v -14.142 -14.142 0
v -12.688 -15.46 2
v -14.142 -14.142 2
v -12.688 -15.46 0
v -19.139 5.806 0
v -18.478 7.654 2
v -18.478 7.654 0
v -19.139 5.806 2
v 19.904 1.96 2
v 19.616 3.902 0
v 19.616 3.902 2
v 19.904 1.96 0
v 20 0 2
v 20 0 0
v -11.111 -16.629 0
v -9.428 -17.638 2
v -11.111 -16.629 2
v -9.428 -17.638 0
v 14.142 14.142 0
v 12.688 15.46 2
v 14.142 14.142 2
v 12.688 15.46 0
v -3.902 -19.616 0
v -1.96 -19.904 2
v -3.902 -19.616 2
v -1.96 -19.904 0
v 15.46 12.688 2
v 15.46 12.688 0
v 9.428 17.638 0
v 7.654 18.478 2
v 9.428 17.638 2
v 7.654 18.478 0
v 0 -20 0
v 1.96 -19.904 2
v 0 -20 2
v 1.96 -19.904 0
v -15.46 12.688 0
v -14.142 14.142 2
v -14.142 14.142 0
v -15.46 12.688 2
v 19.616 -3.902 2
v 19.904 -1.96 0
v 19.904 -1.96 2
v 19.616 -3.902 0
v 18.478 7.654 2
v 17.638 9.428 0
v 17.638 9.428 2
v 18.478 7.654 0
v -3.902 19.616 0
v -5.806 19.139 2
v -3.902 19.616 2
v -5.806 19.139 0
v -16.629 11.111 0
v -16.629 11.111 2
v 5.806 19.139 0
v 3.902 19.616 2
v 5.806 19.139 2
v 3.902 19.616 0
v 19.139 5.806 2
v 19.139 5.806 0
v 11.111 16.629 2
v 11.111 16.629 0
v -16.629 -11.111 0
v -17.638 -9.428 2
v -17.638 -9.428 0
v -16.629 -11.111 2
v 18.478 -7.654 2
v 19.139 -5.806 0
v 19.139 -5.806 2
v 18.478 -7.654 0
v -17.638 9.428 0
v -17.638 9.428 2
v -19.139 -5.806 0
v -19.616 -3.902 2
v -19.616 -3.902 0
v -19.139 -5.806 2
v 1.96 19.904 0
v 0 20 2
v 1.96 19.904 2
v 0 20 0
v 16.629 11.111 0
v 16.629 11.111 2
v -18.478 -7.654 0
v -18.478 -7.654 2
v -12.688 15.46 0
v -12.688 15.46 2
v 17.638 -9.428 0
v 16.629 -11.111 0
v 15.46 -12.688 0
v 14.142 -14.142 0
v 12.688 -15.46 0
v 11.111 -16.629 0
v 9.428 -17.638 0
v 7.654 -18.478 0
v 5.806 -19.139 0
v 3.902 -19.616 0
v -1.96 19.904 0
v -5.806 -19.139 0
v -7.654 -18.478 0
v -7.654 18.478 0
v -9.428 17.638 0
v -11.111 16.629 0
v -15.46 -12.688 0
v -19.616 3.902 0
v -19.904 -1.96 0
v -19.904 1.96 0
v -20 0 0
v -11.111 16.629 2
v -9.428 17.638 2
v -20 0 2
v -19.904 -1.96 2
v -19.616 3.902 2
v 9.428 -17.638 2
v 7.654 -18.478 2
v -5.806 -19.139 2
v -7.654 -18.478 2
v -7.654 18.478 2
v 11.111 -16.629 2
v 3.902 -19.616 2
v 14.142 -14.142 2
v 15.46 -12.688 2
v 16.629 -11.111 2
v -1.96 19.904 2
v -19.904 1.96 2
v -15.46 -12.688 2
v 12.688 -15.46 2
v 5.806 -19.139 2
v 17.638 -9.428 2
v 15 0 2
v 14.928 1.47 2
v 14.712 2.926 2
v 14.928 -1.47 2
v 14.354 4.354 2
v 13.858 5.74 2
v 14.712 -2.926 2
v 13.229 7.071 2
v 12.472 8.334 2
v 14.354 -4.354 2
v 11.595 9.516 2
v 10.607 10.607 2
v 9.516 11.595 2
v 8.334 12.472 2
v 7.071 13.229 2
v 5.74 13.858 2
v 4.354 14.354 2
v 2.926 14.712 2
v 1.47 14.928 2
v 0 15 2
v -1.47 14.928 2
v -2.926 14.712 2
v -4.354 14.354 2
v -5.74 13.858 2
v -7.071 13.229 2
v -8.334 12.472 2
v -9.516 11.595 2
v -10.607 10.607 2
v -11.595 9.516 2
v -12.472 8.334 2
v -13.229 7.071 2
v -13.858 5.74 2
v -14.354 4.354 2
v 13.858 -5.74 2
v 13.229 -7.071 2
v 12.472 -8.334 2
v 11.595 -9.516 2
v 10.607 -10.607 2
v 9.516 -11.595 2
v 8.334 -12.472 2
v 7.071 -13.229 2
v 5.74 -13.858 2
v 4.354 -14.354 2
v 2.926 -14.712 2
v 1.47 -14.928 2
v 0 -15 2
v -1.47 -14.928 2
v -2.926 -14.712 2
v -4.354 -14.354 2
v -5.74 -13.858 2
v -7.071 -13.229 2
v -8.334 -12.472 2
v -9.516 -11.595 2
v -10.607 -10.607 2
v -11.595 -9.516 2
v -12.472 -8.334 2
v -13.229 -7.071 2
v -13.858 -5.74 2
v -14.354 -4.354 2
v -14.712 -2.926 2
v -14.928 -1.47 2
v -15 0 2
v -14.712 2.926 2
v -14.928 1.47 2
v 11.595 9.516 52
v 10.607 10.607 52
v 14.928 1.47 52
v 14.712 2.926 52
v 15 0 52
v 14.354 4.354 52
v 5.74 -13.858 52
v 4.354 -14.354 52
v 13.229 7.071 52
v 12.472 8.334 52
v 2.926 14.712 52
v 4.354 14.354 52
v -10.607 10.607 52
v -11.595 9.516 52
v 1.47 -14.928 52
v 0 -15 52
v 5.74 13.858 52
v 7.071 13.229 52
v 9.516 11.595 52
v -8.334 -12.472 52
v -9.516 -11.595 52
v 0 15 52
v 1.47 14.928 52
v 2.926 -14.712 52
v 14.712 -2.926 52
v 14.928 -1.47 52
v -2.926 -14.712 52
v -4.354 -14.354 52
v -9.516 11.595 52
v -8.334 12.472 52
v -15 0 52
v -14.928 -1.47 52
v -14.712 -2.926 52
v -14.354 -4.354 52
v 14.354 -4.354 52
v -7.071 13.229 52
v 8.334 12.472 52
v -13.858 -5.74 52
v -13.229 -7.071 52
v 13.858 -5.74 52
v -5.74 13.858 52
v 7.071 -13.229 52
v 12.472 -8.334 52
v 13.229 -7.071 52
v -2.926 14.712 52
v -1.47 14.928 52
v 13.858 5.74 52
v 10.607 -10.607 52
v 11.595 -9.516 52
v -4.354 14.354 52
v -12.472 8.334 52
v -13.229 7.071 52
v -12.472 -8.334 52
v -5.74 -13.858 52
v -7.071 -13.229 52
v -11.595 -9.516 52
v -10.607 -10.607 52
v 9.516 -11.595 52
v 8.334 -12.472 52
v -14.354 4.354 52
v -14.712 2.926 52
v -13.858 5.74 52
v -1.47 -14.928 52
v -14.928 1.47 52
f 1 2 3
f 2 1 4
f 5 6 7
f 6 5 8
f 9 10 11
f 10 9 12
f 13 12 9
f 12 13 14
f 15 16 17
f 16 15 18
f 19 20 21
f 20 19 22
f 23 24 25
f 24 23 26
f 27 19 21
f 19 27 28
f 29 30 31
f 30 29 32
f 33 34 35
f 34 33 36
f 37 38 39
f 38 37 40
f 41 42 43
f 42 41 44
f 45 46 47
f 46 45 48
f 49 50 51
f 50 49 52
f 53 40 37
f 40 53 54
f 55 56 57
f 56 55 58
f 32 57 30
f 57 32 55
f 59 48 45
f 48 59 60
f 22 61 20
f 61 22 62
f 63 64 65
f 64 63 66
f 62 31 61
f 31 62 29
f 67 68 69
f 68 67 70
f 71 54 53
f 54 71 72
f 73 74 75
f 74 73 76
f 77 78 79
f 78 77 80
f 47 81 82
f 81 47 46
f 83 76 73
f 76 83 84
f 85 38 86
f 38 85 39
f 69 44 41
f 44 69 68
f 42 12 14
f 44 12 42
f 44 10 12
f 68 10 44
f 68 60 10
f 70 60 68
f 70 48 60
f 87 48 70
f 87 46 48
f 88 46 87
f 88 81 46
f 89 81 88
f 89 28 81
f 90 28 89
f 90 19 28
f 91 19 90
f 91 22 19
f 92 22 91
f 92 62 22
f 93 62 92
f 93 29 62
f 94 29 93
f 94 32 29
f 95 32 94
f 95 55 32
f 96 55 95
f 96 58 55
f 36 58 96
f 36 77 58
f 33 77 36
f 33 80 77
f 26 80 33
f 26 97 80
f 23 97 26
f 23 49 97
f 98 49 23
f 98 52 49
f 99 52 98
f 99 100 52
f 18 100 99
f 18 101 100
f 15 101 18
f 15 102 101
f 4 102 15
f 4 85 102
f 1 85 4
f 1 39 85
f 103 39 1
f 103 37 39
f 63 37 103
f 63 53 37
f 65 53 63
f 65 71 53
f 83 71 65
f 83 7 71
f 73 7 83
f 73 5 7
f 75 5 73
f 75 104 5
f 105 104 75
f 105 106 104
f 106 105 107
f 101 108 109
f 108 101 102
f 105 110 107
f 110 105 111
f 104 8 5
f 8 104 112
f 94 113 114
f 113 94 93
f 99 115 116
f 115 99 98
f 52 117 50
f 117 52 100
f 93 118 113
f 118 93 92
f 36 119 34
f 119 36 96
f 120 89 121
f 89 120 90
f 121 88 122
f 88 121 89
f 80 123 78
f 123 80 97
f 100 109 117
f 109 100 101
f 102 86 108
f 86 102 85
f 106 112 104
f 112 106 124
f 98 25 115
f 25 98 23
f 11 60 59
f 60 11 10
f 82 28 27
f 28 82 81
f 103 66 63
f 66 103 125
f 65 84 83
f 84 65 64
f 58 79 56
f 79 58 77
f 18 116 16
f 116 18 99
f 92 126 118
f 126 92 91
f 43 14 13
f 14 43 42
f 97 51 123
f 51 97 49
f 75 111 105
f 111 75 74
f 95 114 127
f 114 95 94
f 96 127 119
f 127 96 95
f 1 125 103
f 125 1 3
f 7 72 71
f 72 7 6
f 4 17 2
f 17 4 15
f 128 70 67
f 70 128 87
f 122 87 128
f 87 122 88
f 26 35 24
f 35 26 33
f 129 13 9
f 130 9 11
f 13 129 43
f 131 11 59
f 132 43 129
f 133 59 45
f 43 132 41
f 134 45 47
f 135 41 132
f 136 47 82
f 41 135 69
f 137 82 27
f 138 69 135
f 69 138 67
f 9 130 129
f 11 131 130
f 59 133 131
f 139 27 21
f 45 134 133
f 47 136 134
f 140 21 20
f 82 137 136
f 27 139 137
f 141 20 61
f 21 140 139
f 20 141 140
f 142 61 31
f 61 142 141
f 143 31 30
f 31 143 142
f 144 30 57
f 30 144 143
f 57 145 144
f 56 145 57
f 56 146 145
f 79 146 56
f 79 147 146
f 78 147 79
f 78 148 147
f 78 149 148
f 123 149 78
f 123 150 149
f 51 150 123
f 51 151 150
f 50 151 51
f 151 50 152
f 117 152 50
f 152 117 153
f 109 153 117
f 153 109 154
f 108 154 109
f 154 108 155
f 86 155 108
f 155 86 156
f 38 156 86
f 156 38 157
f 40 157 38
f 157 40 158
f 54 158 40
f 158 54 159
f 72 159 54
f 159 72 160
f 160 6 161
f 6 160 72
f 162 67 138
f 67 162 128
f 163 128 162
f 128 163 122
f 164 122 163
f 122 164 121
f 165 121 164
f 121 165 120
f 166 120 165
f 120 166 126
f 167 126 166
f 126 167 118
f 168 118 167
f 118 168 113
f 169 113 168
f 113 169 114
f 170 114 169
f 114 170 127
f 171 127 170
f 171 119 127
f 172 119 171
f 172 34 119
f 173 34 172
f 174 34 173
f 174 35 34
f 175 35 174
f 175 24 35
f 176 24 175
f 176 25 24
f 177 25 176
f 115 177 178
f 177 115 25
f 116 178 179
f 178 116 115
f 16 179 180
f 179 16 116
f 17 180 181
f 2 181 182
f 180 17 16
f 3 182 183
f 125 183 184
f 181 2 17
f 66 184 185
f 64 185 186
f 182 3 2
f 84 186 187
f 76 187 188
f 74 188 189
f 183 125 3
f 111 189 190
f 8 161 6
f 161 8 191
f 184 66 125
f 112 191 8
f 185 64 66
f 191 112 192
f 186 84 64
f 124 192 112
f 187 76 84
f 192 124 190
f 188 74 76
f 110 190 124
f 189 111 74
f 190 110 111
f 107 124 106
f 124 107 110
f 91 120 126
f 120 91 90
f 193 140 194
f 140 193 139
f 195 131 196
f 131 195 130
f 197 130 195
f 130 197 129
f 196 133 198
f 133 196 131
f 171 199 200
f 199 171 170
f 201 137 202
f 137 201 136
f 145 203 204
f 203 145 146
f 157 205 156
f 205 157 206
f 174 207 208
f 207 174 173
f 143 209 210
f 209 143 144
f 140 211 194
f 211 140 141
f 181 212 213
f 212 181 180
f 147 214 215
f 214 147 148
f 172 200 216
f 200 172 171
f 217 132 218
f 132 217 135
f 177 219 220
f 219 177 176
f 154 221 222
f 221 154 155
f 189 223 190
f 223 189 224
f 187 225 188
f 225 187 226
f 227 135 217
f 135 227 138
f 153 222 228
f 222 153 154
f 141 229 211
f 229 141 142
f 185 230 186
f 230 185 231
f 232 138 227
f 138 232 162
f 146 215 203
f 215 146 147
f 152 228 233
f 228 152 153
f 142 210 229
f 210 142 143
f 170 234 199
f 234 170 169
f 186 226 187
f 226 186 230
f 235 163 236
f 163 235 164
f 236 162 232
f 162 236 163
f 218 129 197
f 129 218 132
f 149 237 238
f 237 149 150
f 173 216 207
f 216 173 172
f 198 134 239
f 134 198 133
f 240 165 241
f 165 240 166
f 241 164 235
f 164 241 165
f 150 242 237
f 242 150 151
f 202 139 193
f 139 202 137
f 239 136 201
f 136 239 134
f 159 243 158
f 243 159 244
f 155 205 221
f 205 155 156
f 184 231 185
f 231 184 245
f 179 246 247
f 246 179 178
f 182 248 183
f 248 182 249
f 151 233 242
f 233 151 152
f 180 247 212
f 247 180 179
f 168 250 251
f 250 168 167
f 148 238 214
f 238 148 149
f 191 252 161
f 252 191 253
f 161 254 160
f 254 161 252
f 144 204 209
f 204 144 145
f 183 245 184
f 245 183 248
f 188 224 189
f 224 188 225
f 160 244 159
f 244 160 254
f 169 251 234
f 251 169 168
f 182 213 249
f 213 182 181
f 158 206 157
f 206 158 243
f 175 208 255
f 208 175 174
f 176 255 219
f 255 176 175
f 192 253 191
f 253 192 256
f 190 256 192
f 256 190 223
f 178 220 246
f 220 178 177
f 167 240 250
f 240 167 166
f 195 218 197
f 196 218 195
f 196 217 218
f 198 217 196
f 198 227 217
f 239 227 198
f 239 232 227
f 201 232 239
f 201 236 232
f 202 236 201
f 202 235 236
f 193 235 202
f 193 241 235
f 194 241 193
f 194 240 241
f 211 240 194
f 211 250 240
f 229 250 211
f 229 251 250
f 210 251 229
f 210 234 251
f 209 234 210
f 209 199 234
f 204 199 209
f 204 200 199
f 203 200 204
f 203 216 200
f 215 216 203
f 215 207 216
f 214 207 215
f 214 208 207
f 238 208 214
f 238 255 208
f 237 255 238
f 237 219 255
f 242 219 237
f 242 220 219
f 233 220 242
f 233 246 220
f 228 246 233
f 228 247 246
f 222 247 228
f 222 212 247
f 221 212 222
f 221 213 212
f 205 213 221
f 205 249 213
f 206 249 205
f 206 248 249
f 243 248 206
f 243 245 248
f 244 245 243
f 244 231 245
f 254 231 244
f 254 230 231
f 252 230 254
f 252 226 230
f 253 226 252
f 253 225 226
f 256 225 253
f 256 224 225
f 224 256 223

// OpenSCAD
// Parametric Cylinder
// Demonstrates different cylinder configurations
// License: CC0 (Public Domain)

/* [Shape] */
// Shape type
shape = "cylinder"; // [cylinder, cone, tube, tapered tube]

// Bottom diameter
bottom_diameter = 30; // [5:100]

// Top diameter (for cones and tapered tubes)
top_diameter = 20; // [5:100]

// Height
height = 50; // [5:200]

/* [Tube Settings] */
// Wall thickness (for tubes)
wall_thickness = 3; // [1:0.5:10]

/* [Features] */
// Add base plate
add_base = "yes"; // [yes, no]

// Base plate thickness
base_thickness = 2; // [1:0.5:5]

// Base plate diameter
base_diameter = 40; // [10:150]

// Add top cap
add_cap = "no"; // [yes, no]

/* [Quality] */
// Number of facets (higher = smoother)
$fn = 64; // [16:8:128]

/* [Hidden] */
inner_bottom_diameter = bottom_diameter - (wall_thickness * 2);
inner_top_diameter = top_diameter - (wall_thickness * 2);

// Main module
module main_shape() {
    if (shape == "cylinder") {
        cylinder(d=bottom_diameter, h=height);
    } else if (shape == "cone") {
        cylinder(d1=bottom_diameter, d2=top_diameter, h=height);
    } else if (shape == "tube") {
        difference() {
            cylinder(d=bottom_diameter, h=height);
            translate([0, 0, -0.1])
                cylinder(d=inner_bottom_diameter, h=height + 0.2);
        }
    } else if (shape == "tapered tube") {
        difference() {
            cylinder(d1=bottom_diameter, d2=top_diameter, h=height);
            translate([0, 0, -0.1])
                cylinder(d1=inner_bottom_diameter, d2=inner_top_diameter, h=height + 0.2);
        }
    }
}

module base_plate() {
    cylinder(d=base_diameter, h=base_thickness);
}

module top_cap() {
    translate([0, 0, height]) {
        if (shape == "cylinder" || shape == "tube") {
            cylinder(d=bottom_diameter, h=base_thickness);
        } else {
            cylinder(d=top_diameter, h=base_thickness);
        }
    }
}

// Render
if (add_base == "yes") {
    base_plate();
}

translate([0, 0, add_base == "yes" ? base_thickness : 0]) {
    main_shape();
    
    if (add_cap == "yes") {
        top_cap();
    }
}
